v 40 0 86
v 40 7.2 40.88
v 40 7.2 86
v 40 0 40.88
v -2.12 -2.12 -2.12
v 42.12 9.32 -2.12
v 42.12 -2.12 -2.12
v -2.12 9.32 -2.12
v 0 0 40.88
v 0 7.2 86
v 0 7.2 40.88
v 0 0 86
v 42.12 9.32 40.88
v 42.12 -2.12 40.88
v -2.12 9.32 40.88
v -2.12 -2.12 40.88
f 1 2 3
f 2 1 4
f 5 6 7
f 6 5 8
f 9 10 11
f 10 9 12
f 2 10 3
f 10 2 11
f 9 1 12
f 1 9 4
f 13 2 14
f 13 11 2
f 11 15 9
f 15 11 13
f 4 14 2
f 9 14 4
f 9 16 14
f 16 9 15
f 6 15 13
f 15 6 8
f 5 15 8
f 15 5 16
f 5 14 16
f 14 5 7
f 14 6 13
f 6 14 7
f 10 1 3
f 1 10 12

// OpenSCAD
$fn=36;

//Remote Control

//Remote Control width
rcw=40;
//Remote Control height
rch=86;
//Remote Control thickness
rct=7.2;

//Holder

//Holder thickness
ht=2.12; //5 lines in PrusaSlicer
//Holder height
hh=rch/2;

module remote_control()
{
    color("#777777")
    cube([rcw,rct,rch]);
}

remote_control();

module holder_front_and_back()
{
    cube([rcw,ht,hh]);
}

module holder_bottom()
{
    translate([0,0,-ht])
    cube([rcw,rct,ht]);
}

module holder_left_and_right()
{
    cube([ht,rct+ht*2,hh]);
}

module holder()
{
    //bottom
    holder_bottom();
    //back
    translate([0,rct,-ht])
    holder_front_and_back();
    //left
    translate([-ht,-ht,-ht])
    holder_left_and_right();
    //right
    translate([rcw,-ht,-ht])
    holder_left_and_right();
    //front
    translate([0,-ht,-ht])
    holder_front_and_back();
}

holder();
